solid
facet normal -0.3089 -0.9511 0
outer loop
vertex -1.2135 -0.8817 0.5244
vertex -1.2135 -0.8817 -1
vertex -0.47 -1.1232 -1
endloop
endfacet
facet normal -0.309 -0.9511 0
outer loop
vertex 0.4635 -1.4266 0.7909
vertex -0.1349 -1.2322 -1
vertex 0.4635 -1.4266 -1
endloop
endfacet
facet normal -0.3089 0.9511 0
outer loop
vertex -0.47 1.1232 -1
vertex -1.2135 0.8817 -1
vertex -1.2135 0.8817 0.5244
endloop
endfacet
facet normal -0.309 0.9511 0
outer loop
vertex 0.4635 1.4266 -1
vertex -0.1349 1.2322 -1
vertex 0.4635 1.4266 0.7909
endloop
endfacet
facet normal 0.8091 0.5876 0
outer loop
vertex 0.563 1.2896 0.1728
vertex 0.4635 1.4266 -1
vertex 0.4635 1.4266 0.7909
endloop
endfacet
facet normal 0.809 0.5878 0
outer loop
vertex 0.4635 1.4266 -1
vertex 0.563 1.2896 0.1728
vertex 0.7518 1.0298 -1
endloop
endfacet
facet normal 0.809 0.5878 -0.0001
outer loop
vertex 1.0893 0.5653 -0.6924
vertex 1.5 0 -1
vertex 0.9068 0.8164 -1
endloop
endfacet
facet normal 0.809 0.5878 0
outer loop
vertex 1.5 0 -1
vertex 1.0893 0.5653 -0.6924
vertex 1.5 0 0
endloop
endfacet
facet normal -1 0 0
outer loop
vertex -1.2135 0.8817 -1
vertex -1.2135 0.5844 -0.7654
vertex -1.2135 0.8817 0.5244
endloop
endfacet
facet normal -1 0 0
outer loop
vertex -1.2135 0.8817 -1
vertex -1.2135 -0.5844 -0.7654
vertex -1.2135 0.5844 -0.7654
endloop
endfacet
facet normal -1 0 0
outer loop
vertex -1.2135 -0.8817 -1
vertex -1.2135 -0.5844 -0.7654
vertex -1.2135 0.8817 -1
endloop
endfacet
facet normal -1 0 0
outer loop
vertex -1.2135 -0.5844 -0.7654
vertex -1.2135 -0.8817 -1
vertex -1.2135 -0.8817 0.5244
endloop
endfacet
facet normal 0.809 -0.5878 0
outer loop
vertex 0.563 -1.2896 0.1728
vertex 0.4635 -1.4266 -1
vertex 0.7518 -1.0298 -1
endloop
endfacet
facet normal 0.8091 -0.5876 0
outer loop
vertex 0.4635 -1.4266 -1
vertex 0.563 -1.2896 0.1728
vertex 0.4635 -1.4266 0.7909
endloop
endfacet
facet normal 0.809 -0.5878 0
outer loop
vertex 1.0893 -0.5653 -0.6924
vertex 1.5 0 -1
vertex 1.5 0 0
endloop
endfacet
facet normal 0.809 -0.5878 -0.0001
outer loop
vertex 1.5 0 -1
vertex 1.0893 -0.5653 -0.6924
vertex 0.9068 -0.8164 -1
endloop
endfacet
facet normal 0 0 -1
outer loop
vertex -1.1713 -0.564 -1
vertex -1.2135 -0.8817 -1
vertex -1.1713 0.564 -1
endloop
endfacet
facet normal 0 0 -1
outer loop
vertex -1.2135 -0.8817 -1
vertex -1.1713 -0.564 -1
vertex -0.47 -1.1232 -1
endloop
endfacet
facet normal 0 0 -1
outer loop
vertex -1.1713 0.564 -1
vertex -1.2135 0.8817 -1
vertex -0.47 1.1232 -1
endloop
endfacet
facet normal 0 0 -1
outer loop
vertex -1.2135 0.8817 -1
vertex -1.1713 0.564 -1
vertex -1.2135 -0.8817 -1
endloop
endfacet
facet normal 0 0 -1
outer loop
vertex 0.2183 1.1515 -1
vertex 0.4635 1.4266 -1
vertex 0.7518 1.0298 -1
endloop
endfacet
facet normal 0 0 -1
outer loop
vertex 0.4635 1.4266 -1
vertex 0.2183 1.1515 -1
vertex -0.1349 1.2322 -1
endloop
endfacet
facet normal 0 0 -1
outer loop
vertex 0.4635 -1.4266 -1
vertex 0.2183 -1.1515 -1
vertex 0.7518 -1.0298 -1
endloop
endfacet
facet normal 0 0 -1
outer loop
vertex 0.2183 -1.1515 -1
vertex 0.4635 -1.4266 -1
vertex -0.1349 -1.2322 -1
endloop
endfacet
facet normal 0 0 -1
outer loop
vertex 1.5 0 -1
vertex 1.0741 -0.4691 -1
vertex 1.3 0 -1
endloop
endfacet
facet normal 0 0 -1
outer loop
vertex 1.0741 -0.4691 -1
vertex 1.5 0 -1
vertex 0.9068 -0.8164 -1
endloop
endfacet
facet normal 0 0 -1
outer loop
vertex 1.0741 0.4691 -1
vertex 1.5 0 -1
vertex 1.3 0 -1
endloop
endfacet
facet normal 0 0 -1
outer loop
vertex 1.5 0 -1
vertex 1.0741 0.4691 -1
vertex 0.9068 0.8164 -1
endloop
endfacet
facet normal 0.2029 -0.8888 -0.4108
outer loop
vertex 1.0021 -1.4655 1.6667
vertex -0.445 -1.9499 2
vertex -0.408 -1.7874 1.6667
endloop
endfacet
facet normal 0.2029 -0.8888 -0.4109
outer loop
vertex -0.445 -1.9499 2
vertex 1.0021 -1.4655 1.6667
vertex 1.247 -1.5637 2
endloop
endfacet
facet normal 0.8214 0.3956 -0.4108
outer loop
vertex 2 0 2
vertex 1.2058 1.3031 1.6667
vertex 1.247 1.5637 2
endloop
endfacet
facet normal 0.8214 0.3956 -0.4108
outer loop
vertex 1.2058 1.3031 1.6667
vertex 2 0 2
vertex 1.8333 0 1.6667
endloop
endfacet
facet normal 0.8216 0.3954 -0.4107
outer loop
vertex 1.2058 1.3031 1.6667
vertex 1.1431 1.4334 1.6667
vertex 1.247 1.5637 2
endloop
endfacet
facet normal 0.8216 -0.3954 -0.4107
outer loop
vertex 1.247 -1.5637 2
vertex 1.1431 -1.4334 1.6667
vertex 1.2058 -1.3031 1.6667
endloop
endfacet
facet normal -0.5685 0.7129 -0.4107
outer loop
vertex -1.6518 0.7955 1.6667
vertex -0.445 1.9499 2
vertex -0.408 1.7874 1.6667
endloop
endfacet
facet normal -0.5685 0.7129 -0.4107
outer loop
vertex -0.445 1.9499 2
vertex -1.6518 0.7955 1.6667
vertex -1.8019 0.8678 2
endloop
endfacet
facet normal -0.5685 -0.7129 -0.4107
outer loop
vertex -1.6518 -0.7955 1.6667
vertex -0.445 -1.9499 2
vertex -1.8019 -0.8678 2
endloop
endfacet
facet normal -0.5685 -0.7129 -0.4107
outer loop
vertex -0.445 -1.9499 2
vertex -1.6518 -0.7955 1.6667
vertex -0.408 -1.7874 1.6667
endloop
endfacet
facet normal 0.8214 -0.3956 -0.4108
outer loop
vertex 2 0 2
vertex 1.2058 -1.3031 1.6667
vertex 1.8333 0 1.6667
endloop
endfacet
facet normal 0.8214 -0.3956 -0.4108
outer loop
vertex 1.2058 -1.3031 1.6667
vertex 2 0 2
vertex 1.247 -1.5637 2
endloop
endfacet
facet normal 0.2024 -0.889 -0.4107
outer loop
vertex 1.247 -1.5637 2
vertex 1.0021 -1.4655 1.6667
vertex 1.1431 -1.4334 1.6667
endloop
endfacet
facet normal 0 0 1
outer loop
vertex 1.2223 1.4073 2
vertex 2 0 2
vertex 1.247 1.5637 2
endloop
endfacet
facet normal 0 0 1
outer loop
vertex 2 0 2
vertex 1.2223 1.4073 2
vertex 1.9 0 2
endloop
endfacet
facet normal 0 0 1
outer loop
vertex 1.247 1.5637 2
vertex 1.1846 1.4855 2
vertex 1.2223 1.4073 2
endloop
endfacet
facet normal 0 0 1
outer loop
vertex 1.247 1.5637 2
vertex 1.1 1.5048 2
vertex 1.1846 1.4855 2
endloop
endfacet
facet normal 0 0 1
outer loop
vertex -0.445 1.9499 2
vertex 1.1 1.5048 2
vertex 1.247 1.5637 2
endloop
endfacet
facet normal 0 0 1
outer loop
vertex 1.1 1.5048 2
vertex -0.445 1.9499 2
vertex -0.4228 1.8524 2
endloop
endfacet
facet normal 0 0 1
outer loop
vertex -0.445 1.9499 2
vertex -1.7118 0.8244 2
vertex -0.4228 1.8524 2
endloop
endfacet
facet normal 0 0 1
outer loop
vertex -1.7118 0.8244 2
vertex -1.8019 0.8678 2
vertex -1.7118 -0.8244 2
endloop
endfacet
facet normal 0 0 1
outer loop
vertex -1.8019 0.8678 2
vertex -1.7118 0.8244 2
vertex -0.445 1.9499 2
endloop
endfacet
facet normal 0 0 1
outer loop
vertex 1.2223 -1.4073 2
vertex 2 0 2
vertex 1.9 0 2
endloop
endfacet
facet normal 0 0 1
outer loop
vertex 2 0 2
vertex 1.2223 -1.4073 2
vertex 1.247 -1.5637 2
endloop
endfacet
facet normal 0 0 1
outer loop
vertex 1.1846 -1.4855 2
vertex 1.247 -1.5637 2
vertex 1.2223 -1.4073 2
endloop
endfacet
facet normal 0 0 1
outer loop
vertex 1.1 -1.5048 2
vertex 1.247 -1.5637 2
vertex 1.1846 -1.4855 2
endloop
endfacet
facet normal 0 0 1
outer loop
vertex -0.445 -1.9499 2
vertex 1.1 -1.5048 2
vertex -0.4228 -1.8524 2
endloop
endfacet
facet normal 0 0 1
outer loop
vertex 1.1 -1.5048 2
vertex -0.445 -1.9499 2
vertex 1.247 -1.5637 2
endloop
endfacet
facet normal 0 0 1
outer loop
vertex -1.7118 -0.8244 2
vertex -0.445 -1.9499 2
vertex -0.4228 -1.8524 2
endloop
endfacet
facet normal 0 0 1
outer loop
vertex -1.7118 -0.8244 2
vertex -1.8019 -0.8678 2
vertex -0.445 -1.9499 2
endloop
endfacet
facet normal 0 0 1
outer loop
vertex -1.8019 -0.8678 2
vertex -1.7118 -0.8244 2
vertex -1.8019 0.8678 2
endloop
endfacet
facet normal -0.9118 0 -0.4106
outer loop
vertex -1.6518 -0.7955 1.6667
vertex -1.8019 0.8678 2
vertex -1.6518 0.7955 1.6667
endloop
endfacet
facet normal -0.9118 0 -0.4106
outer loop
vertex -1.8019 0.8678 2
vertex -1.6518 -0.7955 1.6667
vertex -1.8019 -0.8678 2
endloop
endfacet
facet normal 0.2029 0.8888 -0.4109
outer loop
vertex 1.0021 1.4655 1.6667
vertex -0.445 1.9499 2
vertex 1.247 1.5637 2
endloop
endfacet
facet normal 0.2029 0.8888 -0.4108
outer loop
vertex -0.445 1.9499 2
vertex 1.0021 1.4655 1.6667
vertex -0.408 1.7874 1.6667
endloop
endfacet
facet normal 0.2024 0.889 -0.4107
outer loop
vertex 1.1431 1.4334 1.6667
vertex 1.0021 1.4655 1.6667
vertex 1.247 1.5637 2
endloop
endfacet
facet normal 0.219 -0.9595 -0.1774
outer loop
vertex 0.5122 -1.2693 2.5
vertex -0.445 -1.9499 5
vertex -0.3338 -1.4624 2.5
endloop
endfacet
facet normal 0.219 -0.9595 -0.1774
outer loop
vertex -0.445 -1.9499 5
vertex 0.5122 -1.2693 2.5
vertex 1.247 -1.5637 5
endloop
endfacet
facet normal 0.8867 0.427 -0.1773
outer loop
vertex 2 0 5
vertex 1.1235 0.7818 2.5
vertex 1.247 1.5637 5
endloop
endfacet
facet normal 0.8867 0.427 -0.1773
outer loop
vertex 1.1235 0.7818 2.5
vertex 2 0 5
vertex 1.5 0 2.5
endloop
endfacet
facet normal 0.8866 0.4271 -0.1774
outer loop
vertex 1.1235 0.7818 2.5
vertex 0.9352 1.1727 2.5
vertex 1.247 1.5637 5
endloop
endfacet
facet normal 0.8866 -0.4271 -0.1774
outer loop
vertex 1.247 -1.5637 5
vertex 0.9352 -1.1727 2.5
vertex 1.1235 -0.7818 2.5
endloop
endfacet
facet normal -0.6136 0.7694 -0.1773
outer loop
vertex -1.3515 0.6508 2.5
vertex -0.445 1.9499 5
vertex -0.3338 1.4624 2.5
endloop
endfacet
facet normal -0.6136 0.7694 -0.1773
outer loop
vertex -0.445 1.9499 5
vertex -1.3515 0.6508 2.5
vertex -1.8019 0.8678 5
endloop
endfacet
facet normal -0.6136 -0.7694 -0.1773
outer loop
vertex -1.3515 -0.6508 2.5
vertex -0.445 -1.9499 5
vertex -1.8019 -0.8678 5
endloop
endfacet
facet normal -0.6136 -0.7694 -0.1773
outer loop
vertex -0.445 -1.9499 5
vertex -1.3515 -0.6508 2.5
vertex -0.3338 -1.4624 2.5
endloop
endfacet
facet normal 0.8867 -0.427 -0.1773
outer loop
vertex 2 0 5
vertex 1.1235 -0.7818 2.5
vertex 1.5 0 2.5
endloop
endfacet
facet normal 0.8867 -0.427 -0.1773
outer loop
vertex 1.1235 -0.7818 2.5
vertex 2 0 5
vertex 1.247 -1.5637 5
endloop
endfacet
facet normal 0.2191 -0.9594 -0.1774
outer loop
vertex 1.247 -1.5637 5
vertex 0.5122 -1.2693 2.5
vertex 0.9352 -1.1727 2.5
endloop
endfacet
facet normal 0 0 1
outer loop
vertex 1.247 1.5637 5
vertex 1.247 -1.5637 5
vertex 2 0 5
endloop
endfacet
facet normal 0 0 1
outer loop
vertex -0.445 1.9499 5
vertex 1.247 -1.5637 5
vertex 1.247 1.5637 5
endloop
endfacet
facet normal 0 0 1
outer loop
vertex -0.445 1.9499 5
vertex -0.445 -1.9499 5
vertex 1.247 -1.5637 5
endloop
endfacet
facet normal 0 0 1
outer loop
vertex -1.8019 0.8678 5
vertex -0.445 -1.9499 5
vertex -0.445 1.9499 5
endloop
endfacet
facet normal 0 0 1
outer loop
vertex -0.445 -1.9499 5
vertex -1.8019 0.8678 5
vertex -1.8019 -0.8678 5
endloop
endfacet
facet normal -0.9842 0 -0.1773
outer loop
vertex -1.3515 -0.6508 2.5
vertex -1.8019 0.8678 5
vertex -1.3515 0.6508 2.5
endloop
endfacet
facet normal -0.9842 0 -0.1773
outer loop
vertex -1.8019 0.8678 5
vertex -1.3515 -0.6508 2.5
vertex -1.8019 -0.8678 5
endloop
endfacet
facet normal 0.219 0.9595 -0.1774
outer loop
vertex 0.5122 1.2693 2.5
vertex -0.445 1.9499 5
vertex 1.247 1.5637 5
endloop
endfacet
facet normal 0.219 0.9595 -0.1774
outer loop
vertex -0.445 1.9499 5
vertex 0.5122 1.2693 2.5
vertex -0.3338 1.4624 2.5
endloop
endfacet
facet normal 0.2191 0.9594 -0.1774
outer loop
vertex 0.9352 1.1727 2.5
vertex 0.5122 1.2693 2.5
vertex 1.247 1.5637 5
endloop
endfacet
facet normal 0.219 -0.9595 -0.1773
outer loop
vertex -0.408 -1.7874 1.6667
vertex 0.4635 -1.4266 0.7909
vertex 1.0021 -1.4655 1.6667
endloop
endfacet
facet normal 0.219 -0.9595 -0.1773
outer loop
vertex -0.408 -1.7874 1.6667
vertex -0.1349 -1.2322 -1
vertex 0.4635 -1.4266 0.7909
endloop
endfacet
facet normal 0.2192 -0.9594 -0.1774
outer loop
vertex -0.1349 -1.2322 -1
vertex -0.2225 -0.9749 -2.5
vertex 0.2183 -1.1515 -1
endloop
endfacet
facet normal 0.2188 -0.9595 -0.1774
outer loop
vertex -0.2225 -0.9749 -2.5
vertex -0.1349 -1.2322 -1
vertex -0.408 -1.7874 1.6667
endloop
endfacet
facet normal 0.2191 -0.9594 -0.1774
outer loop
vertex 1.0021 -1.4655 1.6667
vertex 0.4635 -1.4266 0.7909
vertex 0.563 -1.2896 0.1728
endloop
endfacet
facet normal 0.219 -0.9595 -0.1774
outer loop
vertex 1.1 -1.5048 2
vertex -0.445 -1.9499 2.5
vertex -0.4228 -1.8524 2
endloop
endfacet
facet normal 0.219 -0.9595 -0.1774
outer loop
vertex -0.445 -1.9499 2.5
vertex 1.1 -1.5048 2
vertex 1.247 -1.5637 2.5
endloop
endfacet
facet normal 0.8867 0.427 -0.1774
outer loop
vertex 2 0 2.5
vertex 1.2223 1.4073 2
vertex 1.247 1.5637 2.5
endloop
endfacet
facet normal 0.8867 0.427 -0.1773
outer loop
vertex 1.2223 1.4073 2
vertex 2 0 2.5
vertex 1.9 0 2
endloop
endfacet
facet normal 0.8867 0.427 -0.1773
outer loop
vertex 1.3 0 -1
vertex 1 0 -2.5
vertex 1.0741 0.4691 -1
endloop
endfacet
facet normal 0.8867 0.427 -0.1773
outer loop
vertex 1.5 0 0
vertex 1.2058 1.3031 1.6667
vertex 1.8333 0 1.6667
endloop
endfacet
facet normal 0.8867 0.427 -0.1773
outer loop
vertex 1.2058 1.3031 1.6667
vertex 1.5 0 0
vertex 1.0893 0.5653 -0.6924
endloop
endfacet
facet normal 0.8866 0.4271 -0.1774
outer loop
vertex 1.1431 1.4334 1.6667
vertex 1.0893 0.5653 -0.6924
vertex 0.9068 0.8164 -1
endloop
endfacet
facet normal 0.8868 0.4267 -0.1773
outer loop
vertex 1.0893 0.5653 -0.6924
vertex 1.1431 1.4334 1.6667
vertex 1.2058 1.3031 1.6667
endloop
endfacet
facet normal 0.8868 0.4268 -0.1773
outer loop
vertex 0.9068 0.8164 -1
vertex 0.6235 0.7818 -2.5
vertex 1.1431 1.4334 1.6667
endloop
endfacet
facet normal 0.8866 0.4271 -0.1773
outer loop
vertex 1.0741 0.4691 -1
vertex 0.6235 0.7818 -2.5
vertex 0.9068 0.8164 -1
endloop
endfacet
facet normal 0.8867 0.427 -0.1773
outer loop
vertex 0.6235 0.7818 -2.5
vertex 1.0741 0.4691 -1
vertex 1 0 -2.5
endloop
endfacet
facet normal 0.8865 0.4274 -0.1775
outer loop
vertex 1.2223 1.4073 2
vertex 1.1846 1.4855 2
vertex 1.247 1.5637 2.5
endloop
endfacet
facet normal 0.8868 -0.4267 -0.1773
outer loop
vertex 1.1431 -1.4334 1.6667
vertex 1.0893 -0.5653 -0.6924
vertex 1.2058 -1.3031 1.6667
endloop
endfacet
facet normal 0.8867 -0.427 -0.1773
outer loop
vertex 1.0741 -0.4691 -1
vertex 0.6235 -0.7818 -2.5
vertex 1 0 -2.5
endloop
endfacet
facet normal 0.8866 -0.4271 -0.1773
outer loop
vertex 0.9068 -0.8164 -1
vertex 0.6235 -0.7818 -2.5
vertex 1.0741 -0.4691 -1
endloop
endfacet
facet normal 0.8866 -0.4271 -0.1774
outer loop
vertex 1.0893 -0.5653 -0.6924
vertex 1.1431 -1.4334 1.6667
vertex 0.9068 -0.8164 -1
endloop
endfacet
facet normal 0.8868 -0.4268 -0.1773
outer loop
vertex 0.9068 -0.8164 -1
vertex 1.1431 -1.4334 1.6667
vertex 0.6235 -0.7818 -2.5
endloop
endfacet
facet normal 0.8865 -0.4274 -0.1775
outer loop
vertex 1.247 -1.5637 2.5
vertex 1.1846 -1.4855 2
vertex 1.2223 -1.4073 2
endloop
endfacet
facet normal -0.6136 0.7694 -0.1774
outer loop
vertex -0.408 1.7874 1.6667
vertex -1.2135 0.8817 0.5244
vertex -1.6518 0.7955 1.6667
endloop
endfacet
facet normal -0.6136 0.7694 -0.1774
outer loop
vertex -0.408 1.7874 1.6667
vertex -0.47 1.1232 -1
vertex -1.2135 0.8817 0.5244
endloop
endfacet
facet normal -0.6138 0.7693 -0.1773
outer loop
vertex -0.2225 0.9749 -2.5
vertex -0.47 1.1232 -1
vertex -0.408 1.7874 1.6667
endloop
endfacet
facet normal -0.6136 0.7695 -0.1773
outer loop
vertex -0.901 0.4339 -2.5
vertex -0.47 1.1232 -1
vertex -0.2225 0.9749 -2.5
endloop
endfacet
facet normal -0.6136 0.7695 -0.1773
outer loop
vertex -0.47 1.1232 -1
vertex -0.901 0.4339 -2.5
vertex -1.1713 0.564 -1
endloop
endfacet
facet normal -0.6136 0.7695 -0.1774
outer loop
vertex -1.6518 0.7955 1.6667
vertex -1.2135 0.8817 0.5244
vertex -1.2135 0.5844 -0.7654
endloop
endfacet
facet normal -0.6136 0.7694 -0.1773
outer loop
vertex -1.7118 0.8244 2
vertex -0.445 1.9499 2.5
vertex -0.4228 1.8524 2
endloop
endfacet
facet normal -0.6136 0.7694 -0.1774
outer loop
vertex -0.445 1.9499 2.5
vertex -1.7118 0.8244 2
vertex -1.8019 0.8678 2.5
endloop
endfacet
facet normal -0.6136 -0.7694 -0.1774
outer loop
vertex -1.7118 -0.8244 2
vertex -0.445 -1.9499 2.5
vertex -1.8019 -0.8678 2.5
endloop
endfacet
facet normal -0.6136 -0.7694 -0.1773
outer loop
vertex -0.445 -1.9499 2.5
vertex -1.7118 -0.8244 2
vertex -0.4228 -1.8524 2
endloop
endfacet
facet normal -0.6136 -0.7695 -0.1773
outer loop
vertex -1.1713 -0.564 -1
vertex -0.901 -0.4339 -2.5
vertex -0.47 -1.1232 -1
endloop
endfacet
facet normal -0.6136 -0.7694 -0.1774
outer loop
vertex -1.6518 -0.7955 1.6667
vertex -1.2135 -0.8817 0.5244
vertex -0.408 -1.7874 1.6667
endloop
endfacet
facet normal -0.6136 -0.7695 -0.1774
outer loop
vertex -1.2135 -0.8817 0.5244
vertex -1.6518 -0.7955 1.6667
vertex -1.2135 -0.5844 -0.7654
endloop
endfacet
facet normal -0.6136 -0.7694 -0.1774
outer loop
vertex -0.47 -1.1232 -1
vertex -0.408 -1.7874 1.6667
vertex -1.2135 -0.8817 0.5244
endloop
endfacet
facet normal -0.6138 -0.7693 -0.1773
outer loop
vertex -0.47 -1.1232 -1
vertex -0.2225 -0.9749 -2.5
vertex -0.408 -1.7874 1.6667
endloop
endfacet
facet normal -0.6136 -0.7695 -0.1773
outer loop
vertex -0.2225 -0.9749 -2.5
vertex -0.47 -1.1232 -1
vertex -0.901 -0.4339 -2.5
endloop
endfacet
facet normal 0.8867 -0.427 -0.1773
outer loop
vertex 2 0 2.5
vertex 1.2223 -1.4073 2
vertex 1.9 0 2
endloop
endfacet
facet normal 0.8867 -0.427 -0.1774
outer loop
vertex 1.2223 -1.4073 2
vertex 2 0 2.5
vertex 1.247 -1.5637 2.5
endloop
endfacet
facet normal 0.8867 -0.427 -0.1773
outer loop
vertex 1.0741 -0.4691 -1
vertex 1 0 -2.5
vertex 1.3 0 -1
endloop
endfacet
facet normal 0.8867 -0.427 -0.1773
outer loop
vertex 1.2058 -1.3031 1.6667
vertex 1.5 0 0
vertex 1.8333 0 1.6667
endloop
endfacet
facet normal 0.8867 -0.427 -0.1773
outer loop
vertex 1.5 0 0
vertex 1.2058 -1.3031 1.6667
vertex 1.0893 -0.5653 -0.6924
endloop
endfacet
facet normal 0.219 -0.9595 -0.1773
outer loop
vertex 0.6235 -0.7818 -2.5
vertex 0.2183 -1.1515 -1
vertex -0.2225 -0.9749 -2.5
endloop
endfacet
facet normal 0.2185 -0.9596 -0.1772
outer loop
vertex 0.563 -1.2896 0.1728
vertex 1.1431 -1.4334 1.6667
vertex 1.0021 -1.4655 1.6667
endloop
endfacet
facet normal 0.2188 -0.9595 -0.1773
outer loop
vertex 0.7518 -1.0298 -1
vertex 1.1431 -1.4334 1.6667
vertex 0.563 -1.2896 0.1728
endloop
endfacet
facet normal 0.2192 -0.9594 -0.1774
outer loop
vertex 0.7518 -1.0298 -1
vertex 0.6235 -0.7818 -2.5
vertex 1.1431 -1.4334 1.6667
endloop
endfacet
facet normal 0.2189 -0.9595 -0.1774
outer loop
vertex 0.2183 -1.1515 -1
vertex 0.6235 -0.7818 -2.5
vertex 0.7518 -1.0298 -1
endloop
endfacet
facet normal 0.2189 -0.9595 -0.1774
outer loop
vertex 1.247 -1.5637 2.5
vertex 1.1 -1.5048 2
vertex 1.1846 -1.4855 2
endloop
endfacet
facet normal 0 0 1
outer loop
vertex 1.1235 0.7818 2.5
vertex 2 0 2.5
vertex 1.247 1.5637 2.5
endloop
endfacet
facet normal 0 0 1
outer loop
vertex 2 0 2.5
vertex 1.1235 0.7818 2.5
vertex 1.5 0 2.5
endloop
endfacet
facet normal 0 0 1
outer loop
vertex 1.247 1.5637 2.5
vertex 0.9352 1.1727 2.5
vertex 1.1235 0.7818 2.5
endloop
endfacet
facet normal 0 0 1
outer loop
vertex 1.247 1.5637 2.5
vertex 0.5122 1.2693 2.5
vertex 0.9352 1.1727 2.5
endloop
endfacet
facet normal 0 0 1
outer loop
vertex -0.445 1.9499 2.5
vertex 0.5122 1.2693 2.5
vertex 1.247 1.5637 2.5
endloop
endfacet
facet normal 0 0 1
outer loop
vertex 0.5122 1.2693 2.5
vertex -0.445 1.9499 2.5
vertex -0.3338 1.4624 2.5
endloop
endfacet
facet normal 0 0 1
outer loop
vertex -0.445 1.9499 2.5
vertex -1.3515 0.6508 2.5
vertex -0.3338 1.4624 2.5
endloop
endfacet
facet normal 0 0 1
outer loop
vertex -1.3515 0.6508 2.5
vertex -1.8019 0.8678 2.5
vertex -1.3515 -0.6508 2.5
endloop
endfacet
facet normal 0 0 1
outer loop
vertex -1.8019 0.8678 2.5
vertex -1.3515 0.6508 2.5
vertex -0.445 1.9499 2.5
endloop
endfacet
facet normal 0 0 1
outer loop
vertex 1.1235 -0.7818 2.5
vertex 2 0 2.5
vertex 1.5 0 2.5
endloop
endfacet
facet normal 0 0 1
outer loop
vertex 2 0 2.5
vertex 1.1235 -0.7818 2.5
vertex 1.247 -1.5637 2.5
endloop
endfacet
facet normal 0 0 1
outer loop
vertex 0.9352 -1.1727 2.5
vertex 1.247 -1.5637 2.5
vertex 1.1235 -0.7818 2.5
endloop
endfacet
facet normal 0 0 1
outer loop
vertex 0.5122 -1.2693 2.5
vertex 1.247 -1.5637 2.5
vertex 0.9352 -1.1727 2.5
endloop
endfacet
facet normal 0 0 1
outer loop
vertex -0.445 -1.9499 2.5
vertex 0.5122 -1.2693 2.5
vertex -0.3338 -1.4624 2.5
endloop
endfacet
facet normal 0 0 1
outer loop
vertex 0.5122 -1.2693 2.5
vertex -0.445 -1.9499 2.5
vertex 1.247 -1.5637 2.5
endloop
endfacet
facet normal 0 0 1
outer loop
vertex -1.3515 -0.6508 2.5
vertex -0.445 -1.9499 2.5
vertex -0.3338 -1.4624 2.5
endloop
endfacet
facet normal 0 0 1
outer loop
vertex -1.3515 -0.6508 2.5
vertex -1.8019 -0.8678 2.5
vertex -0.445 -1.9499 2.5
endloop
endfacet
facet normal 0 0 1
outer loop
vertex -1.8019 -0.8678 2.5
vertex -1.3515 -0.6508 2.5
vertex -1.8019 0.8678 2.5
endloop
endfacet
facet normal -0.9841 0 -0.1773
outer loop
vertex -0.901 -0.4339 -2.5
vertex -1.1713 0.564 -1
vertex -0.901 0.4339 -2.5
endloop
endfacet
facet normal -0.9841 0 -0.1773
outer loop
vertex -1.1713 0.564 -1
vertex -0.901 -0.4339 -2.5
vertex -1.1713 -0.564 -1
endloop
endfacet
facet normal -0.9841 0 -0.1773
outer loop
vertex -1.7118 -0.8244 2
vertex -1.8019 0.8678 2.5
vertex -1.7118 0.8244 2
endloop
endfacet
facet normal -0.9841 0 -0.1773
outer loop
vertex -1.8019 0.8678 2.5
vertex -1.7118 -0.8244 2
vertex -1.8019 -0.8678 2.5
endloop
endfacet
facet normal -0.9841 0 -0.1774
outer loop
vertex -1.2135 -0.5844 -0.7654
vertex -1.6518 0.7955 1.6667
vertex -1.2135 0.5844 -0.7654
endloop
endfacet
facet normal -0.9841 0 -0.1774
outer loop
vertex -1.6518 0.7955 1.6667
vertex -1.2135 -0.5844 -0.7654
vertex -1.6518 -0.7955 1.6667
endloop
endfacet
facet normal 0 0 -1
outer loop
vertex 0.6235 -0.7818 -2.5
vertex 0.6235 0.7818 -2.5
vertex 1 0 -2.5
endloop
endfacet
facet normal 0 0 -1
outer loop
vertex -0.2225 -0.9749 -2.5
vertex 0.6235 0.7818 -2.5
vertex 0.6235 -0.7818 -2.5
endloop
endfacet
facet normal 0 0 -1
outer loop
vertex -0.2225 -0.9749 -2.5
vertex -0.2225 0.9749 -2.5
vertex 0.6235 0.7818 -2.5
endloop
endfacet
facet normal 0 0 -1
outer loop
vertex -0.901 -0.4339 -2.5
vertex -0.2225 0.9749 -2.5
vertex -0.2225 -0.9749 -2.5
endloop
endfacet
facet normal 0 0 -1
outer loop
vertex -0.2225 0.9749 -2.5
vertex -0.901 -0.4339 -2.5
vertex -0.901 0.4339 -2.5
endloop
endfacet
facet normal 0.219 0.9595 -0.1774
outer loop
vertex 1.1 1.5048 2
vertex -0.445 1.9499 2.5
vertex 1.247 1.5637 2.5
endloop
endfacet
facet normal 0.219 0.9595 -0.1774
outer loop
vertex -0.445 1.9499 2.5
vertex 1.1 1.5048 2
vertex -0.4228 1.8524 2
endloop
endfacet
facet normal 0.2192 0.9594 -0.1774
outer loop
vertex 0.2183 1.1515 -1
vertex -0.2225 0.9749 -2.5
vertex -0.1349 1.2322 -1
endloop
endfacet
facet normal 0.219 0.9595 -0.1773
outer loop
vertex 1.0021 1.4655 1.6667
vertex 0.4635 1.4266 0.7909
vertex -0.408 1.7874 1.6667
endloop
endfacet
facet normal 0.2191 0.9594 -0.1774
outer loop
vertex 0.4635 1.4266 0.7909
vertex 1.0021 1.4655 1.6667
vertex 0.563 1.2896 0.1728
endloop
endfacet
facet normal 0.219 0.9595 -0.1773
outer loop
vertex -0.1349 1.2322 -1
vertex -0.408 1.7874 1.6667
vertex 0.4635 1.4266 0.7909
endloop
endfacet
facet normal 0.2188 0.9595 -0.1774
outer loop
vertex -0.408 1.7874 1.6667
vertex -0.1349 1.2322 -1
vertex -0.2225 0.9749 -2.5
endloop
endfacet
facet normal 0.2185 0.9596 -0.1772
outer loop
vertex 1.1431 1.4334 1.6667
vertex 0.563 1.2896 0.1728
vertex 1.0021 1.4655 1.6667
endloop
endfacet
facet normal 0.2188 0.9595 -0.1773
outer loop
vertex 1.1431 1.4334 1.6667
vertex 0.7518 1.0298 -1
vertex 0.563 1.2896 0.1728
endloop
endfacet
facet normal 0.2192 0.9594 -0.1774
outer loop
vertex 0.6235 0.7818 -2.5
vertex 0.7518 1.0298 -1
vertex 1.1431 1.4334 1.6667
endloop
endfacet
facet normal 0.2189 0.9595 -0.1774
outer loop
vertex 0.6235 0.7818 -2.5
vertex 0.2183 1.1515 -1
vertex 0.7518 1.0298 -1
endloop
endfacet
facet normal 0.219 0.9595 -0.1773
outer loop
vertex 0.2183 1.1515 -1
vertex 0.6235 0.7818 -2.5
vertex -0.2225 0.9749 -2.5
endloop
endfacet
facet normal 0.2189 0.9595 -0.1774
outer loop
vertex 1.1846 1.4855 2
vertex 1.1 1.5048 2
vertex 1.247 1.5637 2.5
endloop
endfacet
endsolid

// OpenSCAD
cylinder();
cylinder(h = 2, r = 1);
cylinder(h = 2, d = 3, center = true);
cylinder(h = 2, r1 = 1, r2 = 2);
cylinder(h = 2, d1 = 1, d2 = 2, $fn = 6);
cylinder(5, 1, 2);
cylinder(5, 1, 2, true);
cylinder(h = 3, r = 1, r2 = 0);
